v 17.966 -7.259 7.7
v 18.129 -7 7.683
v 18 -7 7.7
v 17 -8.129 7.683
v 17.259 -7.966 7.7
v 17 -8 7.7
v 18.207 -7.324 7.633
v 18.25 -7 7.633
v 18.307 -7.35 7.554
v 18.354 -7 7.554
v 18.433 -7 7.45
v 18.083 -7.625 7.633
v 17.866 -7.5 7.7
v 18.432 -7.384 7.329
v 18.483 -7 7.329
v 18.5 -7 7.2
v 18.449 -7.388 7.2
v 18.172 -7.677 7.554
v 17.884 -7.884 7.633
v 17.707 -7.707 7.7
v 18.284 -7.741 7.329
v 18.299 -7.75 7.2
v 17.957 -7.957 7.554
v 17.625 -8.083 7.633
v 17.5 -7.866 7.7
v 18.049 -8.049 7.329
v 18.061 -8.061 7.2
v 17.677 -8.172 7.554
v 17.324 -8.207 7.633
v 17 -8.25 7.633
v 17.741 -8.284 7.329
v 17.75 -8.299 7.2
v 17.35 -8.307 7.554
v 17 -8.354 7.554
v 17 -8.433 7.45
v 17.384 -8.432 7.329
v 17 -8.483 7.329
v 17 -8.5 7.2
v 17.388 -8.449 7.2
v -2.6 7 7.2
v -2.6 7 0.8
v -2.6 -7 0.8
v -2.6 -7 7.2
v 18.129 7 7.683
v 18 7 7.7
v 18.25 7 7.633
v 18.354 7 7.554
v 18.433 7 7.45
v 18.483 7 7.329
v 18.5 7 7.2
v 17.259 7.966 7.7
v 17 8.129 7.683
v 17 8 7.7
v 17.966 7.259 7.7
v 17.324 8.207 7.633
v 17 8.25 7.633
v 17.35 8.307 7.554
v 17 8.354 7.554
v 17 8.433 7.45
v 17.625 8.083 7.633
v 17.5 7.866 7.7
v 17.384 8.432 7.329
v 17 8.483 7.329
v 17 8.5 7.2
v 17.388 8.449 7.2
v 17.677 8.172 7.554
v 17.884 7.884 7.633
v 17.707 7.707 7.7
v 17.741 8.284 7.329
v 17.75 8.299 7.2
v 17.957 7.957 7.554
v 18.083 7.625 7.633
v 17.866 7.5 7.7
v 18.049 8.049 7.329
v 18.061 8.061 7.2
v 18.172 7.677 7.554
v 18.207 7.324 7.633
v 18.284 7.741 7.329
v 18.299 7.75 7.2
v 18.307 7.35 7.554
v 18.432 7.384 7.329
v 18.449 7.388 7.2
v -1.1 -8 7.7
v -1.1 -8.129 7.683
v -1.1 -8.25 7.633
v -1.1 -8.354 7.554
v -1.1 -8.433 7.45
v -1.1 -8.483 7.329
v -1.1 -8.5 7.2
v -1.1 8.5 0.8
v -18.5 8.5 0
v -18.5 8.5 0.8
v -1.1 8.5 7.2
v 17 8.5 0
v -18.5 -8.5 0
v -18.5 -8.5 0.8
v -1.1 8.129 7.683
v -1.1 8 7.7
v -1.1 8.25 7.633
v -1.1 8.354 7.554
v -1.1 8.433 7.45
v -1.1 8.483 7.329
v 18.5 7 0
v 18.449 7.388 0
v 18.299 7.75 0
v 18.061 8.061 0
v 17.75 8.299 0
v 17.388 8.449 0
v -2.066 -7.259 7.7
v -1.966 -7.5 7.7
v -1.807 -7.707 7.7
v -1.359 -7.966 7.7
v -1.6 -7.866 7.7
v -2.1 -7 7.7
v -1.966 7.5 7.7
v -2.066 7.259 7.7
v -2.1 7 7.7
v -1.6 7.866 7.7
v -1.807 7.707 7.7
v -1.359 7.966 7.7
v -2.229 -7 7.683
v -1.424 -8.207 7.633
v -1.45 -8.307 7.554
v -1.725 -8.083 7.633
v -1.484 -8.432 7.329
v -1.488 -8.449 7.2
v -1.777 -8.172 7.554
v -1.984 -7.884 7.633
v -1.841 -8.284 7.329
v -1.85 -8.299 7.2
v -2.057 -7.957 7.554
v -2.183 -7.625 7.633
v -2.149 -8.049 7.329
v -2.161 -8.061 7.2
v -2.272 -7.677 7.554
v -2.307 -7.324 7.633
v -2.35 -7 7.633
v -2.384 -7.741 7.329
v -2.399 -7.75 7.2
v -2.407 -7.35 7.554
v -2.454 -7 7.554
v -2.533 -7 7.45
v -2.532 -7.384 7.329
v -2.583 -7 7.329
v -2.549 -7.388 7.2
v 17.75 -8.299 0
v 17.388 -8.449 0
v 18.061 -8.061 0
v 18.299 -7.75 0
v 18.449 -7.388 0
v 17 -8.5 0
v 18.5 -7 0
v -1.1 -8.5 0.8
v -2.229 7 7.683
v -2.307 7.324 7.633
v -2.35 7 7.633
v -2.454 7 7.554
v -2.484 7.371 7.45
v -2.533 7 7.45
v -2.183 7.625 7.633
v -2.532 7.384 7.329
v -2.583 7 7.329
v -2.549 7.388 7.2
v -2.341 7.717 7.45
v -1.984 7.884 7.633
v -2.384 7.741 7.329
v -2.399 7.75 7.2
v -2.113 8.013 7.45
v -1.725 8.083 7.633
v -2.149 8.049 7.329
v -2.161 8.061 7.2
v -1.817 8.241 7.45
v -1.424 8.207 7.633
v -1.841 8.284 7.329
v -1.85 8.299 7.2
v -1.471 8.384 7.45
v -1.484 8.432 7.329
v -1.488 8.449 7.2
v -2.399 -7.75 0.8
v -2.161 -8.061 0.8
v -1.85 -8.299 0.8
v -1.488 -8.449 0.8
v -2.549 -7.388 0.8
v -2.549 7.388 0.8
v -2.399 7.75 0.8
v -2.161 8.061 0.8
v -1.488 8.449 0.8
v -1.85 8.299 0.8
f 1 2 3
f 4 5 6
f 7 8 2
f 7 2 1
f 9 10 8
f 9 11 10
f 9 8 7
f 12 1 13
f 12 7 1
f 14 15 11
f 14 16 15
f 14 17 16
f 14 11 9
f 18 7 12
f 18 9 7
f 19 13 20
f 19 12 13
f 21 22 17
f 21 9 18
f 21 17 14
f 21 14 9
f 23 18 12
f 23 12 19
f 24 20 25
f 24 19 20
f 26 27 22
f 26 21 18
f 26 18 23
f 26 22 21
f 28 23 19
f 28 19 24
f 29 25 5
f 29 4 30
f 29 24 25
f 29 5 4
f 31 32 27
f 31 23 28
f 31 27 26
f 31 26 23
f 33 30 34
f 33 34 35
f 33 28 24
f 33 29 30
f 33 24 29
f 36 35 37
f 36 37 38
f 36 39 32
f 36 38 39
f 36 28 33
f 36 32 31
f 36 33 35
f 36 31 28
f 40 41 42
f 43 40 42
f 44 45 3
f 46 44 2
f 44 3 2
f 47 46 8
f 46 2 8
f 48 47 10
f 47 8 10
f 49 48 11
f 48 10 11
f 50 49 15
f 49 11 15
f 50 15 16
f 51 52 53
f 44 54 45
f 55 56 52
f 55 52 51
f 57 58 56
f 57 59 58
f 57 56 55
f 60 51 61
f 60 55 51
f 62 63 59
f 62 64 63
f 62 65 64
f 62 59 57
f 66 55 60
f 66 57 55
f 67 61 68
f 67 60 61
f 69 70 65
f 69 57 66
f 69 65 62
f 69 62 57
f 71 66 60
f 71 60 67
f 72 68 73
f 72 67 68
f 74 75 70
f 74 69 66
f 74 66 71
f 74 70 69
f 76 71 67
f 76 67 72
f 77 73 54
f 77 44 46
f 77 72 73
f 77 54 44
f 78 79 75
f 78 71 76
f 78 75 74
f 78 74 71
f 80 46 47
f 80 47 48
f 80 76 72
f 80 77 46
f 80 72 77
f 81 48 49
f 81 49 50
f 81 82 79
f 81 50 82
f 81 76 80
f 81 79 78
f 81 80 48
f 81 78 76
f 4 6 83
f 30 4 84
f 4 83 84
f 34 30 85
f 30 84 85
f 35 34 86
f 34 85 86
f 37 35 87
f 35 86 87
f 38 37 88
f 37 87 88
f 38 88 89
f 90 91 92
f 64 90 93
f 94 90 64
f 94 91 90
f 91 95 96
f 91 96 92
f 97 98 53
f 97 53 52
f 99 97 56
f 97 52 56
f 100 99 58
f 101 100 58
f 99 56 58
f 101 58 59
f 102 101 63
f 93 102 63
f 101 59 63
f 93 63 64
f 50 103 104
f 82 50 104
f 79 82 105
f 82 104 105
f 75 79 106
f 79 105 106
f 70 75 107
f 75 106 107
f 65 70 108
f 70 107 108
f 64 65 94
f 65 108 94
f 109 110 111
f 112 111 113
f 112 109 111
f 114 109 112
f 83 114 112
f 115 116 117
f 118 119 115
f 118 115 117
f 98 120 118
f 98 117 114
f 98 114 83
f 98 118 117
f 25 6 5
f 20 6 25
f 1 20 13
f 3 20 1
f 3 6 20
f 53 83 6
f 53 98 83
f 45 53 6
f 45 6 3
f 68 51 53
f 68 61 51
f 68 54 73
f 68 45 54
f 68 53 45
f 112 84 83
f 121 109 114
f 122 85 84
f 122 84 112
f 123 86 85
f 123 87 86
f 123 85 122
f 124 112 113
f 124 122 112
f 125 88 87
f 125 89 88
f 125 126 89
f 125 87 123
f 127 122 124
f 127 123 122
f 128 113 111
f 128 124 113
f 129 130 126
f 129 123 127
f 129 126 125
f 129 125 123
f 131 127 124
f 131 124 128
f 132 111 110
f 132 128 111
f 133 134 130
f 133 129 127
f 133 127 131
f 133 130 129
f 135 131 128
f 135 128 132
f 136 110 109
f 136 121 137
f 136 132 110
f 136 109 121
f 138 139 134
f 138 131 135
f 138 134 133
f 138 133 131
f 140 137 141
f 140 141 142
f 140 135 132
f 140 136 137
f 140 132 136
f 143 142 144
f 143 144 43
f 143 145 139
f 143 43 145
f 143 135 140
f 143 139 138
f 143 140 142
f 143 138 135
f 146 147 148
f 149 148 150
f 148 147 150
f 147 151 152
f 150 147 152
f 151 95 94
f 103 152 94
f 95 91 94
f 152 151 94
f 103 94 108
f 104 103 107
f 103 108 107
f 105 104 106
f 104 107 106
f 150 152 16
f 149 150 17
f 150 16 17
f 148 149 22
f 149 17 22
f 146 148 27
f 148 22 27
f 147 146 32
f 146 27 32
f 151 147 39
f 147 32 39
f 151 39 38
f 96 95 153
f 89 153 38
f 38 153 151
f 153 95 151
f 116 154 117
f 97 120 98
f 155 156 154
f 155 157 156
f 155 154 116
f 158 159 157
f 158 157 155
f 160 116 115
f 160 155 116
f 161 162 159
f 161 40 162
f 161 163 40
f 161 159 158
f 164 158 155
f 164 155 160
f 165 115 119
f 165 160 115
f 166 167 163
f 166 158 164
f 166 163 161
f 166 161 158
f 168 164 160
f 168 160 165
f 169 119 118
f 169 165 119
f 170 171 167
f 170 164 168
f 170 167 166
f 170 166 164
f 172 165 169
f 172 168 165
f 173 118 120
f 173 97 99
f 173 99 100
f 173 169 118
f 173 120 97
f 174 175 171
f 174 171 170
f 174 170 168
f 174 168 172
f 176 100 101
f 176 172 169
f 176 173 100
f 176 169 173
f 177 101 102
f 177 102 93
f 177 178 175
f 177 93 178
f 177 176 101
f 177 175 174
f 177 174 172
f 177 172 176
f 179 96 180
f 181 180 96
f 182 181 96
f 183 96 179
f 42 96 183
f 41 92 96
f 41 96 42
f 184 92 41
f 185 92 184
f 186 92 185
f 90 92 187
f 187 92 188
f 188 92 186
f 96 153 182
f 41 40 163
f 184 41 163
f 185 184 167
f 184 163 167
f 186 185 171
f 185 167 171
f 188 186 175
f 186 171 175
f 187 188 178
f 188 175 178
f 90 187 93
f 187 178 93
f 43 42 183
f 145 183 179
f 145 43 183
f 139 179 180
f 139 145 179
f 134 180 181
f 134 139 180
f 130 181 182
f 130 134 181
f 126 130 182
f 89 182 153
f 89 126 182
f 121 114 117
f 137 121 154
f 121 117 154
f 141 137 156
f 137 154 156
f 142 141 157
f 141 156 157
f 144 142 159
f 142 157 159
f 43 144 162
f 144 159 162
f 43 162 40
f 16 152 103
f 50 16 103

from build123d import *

# Parameters (mm, degrees)
F0_W     = 37
F0_H     = 17
F1_DEPTH = 0.8
F2_W     = 21.1
F2_H     = 8.5
F3_DEPTH = 6.9
F4_R     = 1.5
F5_R     = 0.5


with BuildPart() as f1:
    # F0 (on Top) → F1 (new body)
    with BuildSketch(Plane.XY):
        Rectangle(F0_W, F0_H)
    extrude(amount=F1_DEPTH)

    # F2 (on face) → F3 (join)
    with BuildSketch(Plane.XY.offset(0.8)):
        with Locations((7.95, 4.25)):
            Rectangle(F2_W, F2_H)
        with Locations((7.95, -4.25)):
            Rectangle(F2_W, F2_H)
    extrude(amount=F3_DEPTH)

    # F4
    f4_edges = [f1.edges().sort_by_distance(p)[0] for p in [
        (18.5, -8.5, 3.85),
        (18.5, 8.5, 3.85),
        (-2.6, 8.5, 4.25),
        (-2.6, -8.5, 4.25),
    ]]
    fillet(f4_edges, radius=F4_R)

    # F5
    f5_edges = [f1.edges().sort_by_distance(p)[0] for p in [
        (7.95, 8.5, 7.7),
    ]]
    fillet(f5_edges, radius=F5_R)


solid = f1.part
